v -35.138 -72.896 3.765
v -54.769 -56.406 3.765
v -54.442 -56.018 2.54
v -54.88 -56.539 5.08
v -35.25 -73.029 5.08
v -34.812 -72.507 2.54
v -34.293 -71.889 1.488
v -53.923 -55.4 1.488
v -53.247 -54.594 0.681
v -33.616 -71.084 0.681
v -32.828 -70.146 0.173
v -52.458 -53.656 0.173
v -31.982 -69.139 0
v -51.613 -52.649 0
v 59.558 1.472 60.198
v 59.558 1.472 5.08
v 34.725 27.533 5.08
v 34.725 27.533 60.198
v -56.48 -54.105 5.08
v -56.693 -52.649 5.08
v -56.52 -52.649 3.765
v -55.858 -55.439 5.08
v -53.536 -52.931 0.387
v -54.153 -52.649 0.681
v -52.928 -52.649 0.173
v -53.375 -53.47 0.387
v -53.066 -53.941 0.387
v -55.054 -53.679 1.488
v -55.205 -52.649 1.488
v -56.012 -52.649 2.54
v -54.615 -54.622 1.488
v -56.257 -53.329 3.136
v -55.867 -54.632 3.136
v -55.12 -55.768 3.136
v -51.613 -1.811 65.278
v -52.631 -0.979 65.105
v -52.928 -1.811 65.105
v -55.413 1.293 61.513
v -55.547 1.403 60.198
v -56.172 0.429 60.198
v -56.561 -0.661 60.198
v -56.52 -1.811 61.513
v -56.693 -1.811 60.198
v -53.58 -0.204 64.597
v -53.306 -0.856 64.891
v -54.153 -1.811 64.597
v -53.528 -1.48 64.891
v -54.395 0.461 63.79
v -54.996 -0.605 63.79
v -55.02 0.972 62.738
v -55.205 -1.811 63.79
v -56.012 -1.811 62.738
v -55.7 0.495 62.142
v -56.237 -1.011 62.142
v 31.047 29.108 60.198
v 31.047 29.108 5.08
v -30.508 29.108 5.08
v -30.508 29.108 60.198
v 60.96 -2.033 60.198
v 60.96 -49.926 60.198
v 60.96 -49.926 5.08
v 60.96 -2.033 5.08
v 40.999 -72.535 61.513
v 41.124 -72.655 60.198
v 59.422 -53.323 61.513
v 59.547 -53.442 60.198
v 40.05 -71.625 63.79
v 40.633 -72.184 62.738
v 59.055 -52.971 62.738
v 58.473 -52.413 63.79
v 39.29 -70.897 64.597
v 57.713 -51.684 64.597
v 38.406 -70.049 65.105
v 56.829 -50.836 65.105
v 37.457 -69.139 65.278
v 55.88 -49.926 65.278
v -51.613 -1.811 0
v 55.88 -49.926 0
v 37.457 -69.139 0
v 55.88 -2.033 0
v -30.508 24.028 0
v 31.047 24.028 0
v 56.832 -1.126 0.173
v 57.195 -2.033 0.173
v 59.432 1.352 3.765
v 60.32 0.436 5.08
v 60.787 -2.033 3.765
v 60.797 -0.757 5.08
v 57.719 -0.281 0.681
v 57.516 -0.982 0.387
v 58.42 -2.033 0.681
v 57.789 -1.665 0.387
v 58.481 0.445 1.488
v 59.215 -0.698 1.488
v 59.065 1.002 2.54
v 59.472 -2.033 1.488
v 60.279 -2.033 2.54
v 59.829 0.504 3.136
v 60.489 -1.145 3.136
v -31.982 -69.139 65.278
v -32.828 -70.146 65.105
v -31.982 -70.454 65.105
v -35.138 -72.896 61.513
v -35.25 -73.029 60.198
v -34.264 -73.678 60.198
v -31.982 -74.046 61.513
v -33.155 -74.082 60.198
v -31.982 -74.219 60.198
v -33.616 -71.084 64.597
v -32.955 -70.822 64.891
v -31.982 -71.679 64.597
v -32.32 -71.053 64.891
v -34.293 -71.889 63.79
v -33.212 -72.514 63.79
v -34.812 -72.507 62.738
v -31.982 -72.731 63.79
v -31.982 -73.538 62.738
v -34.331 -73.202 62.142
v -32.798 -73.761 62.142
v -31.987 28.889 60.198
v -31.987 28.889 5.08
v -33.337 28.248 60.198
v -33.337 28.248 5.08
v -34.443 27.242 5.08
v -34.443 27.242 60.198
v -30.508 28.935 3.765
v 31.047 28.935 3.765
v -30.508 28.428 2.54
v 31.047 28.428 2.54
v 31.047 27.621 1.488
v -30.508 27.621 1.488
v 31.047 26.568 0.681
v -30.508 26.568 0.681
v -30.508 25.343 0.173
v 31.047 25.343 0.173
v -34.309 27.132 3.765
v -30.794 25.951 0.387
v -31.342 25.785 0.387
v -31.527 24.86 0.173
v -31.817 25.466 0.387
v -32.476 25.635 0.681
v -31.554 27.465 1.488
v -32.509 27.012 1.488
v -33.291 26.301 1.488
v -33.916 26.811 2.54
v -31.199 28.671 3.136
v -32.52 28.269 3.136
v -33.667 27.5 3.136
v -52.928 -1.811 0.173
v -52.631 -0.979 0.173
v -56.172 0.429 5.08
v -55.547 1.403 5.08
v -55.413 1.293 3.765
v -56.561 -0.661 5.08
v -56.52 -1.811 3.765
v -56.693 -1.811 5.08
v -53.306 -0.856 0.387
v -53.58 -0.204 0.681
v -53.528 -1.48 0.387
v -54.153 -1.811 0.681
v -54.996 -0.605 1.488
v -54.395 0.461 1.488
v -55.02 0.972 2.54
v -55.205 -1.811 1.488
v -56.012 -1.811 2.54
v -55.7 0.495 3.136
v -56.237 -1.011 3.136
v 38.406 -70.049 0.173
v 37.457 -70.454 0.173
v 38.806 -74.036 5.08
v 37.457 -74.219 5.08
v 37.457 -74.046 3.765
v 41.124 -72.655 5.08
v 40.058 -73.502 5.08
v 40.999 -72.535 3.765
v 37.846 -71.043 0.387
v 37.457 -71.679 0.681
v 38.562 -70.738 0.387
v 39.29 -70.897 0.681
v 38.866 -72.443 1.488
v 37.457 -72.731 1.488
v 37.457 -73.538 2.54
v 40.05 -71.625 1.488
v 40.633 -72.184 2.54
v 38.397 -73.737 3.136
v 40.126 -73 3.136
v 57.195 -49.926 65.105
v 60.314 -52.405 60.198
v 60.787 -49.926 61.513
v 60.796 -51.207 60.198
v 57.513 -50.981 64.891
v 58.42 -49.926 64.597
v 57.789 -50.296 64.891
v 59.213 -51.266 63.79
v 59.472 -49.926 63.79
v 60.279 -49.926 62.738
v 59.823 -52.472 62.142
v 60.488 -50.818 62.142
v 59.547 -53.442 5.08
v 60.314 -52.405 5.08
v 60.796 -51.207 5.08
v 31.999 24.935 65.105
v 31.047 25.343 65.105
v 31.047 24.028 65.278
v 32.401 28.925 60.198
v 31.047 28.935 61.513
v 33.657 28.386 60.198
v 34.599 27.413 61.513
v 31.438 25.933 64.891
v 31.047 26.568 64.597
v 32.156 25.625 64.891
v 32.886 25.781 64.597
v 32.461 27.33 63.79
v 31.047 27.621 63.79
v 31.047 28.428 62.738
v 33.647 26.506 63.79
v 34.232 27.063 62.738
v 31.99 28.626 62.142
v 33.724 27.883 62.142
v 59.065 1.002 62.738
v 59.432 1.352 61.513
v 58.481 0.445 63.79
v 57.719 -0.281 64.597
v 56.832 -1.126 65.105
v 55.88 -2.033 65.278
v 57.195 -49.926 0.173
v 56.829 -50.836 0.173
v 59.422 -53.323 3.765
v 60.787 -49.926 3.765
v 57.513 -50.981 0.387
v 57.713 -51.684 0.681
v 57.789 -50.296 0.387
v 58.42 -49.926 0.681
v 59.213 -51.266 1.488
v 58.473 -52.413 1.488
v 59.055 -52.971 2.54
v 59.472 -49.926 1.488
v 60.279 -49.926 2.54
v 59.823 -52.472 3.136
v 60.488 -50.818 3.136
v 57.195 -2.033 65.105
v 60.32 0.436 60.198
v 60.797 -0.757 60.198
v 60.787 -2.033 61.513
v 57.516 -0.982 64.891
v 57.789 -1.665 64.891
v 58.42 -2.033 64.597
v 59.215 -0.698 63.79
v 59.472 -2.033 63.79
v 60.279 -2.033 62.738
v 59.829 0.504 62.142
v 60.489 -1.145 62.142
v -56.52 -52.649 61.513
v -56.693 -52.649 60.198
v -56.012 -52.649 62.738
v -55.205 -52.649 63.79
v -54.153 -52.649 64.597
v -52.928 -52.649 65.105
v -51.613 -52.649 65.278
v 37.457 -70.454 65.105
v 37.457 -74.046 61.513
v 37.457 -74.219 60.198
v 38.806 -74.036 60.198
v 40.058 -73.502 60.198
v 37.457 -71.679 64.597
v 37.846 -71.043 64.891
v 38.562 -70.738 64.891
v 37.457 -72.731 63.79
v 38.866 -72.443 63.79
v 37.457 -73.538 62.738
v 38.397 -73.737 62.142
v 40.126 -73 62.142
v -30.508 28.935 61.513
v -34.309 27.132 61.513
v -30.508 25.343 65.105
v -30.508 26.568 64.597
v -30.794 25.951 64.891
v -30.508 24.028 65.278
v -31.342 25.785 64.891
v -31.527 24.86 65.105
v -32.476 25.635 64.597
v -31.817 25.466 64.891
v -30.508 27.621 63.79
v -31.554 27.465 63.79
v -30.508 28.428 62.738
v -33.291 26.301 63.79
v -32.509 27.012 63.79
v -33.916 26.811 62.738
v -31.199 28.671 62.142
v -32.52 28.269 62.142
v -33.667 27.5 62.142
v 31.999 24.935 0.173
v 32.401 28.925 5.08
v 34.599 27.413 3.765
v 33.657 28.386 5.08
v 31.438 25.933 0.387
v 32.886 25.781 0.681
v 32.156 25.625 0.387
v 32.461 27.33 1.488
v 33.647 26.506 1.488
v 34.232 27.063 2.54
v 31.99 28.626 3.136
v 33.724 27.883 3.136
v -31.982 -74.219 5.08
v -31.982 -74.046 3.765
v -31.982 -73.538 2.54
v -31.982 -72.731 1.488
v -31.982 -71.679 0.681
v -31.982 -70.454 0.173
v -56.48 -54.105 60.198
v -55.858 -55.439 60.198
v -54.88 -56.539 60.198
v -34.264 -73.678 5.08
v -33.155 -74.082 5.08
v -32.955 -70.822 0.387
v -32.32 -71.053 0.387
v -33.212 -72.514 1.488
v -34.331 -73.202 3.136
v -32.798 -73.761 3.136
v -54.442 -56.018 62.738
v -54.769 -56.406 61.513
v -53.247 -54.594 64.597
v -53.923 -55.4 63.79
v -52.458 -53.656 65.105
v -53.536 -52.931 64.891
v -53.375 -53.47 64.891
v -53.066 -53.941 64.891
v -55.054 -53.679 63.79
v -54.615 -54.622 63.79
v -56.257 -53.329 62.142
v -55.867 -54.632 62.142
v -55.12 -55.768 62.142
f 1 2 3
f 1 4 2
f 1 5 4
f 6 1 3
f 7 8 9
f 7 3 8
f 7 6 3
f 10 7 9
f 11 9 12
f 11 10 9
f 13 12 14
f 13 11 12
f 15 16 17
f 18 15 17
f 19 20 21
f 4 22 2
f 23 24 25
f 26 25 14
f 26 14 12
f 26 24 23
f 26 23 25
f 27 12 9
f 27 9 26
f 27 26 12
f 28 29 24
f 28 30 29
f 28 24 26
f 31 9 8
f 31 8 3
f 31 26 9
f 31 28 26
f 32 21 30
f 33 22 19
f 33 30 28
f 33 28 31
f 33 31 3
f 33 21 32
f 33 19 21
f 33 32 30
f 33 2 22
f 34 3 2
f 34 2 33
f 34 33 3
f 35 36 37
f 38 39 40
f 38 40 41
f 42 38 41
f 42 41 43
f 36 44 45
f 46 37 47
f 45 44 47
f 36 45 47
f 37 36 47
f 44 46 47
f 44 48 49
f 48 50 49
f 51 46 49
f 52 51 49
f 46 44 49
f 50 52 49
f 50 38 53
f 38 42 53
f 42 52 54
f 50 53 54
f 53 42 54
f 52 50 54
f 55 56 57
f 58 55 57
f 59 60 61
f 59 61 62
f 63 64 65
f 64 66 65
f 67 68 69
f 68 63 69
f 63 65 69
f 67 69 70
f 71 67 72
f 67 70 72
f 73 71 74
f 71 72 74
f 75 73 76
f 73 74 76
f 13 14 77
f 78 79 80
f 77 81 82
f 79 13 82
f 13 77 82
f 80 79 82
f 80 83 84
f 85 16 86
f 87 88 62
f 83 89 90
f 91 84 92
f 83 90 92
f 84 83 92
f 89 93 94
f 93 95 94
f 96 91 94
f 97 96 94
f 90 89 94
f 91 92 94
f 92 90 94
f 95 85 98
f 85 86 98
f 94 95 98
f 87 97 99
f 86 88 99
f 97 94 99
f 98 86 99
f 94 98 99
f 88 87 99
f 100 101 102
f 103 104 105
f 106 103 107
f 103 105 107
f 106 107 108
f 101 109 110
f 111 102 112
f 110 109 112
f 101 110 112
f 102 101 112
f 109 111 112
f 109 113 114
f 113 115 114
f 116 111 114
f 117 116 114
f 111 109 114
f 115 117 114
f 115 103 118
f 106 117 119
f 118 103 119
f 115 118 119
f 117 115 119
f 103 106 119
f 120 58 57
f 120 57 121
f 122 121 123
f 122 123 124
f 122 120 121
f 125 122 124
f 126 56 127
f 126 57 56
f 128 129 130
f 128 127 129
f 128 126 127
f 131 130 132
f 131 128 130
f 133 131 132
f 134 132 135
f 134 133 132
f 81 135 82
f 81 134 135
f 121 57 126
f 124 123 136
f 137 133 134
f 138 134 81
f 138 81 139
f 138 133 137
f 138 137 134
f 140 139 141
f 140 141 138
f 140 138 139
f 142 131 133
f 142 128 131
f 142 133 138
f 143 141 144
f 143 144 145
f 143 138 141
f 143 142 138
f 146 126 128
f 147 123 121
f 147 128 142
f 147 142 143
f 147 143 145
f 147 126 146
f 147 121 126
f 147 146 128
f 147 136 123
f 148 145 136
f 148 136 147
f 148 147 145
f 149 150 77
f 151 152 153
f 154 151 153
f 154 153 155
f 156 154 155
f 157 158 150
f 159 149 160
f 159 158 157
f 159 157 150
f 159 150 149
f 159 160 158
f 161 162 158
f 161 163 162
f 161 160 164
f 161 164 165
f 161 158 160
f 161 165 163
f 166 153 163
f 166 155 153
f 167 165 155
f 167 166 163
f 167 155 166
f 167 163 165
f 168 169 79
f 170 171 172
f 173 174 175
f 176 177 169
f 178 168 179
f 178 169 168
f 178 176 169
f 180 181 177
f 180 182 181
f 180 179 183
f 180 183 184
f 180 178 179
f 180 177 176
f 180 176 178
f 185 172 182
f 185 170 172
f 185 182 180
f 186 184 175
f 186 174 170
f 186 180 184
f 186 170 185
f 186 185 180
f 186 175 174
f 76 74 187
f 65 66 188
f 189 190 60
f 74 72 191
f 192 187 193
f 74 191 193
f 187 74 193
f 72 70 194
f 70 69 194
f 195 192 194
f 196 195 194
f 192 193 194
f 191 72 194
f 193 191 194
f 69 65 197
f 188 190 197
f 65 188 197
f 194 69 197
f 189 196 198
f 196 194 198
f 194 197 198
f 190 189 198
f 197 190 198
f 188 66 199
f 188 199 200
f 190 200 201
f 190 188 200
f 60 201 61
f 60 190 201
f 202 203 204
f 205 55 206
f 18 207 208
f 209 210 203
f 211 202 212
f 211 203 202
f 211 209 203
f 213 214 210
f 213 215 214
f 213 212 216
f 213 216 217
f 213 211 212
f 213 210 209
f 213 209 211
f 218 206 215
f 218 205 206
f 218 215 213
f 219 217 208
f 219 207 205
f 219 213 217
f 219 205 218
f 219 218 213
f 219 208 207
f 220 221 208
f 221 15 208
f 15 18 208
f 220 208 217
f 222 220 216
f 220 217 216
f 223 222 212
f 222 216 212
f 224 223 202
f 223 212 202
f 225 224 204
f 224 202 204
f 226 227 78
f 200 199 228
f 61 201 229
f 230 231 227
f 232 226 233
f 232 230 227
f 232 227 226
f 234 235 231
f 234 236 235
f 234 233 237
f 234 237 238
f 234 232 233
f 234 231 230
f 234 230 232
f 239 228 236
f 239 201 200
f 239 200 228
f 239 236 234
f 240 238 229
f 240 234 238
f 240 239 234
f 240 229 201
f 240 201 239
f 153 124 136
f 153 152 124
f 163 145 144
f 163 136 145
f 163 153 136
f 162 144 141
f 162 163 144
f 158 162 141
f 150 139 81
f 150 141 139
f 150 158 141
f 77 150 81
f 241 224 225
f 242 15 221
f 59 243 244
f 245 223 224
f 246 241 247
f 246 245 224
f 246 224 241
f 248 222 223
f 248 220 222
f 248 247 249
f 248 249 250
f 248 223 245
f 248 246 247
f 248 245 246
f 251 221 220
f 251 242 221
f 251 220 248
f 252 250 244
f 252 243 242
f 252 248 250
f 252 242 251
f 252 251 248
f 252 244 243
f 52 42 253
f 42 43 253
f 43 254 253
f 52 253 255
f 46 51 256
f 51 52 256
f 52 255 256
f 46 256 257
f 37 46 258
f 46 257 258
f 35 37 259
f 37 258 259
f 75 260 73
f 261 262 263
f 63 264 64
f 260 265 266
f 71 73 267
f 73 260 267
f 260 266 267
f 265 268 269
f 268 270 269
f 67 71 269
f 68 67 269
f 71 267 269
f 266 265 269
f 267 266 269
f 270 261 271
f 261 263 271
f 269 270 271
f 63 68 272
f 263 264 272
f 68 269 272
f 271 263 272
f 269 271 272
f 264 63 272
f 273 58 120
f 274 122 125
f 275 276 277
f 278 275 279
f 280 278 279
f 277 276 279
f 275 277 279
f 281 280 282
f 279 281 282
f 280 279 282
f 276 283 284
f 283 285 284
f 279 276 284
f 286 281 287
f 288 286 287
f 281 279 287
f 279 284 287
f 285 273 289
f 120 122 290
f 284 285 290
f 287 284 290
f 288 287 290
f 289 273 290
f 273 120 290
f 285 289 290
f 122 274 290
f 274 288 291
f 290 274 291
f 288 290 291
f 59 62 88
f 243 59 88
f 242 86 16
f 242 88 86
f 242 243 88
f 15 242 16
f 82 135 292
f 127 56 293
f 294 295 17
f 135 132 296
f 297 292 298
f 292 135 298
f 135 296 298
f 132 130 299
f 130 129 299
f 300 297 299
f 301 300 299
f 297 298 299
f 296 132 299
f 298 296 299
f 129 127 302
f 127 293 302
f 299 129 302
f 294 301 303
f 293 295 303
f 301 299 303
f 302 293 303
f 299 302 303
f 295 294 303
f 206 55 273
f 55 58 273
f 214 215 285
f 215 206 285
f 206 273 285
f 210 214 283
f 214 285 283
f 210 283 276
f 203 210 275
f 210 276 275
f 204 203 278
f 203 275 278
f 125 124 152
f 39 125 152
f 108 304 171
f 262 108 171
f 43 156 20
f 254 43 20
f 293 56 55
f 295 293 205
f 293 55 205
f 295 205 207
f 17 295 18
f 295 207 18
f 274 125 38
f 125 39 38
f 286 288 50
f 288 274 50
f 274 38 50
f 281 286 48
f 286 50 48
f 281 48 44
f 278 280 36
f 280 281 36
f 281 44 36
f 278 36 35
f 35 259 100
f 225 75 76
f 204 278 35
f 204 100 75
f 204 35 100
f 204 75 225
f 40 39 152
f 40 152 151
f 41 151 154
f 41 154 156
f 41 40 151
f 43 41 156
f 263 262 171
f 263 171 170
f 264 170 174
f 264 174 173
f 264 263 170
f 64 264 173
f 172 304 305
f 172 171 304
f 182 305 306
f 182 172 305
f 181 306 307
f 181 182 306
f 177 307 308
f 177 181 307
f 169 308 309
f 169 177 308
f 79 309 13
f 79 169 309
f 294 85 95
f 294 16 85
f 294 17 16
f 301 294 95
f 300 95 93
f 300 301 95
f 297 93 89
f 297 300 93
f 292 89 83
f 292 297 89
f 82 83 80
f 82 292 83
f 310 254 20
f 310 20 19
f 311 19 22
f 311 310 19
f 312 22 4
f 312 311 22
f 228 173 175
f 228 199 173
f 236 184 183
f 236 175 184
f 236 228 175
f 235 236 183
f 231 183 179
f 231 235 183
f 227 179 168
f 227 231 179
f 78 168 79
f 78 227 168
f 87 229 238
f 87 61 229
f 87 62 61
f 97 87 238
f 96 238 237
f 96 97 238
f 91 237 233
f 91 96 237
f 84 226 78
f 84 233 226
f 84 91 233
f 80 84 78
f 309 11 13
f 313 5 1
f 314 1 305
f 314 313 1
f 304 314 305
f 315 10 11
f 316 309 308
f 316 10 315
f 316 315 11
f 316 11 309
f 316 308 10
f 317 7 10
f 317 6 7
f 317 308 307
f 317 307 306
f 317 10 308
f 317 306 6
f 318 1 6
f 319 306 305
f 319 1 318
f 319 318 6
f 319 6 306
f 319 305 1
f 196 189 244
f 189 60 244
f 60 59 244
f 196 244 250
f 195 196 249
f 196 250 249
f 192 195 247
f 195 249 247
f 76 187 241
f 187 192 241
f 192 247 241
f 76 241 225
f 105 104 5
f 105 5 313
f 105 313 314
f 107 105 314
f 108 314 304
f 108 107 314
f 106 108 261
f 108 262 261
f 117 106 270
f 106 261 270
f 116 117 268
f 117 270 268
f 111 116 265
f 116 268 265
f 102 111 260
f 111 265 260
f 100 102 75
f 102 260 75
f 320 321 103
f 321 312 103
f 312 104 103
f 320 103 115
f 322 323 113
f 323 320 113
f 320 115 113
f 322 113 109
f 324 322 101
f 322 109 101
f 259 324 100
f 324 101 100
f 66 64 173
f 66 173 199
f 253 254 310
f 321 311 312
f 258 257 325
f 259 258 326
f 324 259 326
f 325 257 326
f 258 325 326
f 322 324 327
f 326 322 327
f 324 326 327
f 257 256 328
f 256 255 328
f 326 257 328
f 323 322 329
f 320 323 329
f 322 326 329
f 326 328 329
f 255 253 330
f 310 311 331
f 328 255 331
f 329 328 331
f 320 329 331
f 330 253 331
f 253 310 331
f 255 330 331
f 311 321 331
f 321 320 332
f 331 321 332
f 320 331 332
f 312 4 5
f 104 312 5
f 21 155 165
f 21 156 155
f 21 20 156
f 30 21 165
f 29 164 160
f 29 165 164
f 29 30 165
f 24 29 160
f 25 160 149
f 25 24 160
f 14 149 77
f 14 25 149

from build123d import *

# Parameters (mm, degrees)
F1_DEPTH = 65.278
F2_R     = 5.08


with BuildPart() as f1:
    # F0 (on Top) → F1 (new body)
    with BuildSketch(Plane.XY):
        Polygon((33.223204, 29.108401), (-32.918401, 29.108401), (-56.692801, 0), (-56.692801, -55.016398), (-33.8328, -74.218802), (39.624002, -74.218802), (60.960002, -51.968399), (60.960002, 0), align=None)
    extrude(amount=F1_DEPTH)

    # F2
    f2_edges = [f1.edges().sort_by_distance(p)[0] for p in [
        (33.223204, 29.108401, 32.639),
        (-32.918401, 29.108401, 32.639),
        (0.152402, 29.108401, 0),
        (0.152402, 29.108401, 65.278),
        (60.960002, 0, 32.639),
        (47.091603, 14.554201, 0),
        (47.091603, 14.554201, 65.278),
        (-56.692801, 0, 32.639),
        (-44.805601, 14.554201, 0),
        (-44.805601, 14.554201, 65.278),
        (-56.692801, -55.016398, 32.639),
        (-56.692801, -27.508199, 0),
        (-56.692801, -27.508199, 65.278),
        (-33.8328, -74.218802, 32.639),
        (-45.262801, -64.6176, 0),
        (-45.262801, -64.6176, 65.278),
        (39.624002, -74.218802, 32.639),
        (2.895601, -74.218802, 0),
        (2.895601, -74.218802, 65.278),
        (60.960002, -51.968399, 32.639),
        (50.292002, -63.093601, 0),
        (50.292002, -63.093601, 65.278),
        (60.960002, -25.9842, 0),
        (60.960002, -25.9842, 65.278),
    ]]
    fillet(f2_edges, radius=F2_R)


solid = f1.part
